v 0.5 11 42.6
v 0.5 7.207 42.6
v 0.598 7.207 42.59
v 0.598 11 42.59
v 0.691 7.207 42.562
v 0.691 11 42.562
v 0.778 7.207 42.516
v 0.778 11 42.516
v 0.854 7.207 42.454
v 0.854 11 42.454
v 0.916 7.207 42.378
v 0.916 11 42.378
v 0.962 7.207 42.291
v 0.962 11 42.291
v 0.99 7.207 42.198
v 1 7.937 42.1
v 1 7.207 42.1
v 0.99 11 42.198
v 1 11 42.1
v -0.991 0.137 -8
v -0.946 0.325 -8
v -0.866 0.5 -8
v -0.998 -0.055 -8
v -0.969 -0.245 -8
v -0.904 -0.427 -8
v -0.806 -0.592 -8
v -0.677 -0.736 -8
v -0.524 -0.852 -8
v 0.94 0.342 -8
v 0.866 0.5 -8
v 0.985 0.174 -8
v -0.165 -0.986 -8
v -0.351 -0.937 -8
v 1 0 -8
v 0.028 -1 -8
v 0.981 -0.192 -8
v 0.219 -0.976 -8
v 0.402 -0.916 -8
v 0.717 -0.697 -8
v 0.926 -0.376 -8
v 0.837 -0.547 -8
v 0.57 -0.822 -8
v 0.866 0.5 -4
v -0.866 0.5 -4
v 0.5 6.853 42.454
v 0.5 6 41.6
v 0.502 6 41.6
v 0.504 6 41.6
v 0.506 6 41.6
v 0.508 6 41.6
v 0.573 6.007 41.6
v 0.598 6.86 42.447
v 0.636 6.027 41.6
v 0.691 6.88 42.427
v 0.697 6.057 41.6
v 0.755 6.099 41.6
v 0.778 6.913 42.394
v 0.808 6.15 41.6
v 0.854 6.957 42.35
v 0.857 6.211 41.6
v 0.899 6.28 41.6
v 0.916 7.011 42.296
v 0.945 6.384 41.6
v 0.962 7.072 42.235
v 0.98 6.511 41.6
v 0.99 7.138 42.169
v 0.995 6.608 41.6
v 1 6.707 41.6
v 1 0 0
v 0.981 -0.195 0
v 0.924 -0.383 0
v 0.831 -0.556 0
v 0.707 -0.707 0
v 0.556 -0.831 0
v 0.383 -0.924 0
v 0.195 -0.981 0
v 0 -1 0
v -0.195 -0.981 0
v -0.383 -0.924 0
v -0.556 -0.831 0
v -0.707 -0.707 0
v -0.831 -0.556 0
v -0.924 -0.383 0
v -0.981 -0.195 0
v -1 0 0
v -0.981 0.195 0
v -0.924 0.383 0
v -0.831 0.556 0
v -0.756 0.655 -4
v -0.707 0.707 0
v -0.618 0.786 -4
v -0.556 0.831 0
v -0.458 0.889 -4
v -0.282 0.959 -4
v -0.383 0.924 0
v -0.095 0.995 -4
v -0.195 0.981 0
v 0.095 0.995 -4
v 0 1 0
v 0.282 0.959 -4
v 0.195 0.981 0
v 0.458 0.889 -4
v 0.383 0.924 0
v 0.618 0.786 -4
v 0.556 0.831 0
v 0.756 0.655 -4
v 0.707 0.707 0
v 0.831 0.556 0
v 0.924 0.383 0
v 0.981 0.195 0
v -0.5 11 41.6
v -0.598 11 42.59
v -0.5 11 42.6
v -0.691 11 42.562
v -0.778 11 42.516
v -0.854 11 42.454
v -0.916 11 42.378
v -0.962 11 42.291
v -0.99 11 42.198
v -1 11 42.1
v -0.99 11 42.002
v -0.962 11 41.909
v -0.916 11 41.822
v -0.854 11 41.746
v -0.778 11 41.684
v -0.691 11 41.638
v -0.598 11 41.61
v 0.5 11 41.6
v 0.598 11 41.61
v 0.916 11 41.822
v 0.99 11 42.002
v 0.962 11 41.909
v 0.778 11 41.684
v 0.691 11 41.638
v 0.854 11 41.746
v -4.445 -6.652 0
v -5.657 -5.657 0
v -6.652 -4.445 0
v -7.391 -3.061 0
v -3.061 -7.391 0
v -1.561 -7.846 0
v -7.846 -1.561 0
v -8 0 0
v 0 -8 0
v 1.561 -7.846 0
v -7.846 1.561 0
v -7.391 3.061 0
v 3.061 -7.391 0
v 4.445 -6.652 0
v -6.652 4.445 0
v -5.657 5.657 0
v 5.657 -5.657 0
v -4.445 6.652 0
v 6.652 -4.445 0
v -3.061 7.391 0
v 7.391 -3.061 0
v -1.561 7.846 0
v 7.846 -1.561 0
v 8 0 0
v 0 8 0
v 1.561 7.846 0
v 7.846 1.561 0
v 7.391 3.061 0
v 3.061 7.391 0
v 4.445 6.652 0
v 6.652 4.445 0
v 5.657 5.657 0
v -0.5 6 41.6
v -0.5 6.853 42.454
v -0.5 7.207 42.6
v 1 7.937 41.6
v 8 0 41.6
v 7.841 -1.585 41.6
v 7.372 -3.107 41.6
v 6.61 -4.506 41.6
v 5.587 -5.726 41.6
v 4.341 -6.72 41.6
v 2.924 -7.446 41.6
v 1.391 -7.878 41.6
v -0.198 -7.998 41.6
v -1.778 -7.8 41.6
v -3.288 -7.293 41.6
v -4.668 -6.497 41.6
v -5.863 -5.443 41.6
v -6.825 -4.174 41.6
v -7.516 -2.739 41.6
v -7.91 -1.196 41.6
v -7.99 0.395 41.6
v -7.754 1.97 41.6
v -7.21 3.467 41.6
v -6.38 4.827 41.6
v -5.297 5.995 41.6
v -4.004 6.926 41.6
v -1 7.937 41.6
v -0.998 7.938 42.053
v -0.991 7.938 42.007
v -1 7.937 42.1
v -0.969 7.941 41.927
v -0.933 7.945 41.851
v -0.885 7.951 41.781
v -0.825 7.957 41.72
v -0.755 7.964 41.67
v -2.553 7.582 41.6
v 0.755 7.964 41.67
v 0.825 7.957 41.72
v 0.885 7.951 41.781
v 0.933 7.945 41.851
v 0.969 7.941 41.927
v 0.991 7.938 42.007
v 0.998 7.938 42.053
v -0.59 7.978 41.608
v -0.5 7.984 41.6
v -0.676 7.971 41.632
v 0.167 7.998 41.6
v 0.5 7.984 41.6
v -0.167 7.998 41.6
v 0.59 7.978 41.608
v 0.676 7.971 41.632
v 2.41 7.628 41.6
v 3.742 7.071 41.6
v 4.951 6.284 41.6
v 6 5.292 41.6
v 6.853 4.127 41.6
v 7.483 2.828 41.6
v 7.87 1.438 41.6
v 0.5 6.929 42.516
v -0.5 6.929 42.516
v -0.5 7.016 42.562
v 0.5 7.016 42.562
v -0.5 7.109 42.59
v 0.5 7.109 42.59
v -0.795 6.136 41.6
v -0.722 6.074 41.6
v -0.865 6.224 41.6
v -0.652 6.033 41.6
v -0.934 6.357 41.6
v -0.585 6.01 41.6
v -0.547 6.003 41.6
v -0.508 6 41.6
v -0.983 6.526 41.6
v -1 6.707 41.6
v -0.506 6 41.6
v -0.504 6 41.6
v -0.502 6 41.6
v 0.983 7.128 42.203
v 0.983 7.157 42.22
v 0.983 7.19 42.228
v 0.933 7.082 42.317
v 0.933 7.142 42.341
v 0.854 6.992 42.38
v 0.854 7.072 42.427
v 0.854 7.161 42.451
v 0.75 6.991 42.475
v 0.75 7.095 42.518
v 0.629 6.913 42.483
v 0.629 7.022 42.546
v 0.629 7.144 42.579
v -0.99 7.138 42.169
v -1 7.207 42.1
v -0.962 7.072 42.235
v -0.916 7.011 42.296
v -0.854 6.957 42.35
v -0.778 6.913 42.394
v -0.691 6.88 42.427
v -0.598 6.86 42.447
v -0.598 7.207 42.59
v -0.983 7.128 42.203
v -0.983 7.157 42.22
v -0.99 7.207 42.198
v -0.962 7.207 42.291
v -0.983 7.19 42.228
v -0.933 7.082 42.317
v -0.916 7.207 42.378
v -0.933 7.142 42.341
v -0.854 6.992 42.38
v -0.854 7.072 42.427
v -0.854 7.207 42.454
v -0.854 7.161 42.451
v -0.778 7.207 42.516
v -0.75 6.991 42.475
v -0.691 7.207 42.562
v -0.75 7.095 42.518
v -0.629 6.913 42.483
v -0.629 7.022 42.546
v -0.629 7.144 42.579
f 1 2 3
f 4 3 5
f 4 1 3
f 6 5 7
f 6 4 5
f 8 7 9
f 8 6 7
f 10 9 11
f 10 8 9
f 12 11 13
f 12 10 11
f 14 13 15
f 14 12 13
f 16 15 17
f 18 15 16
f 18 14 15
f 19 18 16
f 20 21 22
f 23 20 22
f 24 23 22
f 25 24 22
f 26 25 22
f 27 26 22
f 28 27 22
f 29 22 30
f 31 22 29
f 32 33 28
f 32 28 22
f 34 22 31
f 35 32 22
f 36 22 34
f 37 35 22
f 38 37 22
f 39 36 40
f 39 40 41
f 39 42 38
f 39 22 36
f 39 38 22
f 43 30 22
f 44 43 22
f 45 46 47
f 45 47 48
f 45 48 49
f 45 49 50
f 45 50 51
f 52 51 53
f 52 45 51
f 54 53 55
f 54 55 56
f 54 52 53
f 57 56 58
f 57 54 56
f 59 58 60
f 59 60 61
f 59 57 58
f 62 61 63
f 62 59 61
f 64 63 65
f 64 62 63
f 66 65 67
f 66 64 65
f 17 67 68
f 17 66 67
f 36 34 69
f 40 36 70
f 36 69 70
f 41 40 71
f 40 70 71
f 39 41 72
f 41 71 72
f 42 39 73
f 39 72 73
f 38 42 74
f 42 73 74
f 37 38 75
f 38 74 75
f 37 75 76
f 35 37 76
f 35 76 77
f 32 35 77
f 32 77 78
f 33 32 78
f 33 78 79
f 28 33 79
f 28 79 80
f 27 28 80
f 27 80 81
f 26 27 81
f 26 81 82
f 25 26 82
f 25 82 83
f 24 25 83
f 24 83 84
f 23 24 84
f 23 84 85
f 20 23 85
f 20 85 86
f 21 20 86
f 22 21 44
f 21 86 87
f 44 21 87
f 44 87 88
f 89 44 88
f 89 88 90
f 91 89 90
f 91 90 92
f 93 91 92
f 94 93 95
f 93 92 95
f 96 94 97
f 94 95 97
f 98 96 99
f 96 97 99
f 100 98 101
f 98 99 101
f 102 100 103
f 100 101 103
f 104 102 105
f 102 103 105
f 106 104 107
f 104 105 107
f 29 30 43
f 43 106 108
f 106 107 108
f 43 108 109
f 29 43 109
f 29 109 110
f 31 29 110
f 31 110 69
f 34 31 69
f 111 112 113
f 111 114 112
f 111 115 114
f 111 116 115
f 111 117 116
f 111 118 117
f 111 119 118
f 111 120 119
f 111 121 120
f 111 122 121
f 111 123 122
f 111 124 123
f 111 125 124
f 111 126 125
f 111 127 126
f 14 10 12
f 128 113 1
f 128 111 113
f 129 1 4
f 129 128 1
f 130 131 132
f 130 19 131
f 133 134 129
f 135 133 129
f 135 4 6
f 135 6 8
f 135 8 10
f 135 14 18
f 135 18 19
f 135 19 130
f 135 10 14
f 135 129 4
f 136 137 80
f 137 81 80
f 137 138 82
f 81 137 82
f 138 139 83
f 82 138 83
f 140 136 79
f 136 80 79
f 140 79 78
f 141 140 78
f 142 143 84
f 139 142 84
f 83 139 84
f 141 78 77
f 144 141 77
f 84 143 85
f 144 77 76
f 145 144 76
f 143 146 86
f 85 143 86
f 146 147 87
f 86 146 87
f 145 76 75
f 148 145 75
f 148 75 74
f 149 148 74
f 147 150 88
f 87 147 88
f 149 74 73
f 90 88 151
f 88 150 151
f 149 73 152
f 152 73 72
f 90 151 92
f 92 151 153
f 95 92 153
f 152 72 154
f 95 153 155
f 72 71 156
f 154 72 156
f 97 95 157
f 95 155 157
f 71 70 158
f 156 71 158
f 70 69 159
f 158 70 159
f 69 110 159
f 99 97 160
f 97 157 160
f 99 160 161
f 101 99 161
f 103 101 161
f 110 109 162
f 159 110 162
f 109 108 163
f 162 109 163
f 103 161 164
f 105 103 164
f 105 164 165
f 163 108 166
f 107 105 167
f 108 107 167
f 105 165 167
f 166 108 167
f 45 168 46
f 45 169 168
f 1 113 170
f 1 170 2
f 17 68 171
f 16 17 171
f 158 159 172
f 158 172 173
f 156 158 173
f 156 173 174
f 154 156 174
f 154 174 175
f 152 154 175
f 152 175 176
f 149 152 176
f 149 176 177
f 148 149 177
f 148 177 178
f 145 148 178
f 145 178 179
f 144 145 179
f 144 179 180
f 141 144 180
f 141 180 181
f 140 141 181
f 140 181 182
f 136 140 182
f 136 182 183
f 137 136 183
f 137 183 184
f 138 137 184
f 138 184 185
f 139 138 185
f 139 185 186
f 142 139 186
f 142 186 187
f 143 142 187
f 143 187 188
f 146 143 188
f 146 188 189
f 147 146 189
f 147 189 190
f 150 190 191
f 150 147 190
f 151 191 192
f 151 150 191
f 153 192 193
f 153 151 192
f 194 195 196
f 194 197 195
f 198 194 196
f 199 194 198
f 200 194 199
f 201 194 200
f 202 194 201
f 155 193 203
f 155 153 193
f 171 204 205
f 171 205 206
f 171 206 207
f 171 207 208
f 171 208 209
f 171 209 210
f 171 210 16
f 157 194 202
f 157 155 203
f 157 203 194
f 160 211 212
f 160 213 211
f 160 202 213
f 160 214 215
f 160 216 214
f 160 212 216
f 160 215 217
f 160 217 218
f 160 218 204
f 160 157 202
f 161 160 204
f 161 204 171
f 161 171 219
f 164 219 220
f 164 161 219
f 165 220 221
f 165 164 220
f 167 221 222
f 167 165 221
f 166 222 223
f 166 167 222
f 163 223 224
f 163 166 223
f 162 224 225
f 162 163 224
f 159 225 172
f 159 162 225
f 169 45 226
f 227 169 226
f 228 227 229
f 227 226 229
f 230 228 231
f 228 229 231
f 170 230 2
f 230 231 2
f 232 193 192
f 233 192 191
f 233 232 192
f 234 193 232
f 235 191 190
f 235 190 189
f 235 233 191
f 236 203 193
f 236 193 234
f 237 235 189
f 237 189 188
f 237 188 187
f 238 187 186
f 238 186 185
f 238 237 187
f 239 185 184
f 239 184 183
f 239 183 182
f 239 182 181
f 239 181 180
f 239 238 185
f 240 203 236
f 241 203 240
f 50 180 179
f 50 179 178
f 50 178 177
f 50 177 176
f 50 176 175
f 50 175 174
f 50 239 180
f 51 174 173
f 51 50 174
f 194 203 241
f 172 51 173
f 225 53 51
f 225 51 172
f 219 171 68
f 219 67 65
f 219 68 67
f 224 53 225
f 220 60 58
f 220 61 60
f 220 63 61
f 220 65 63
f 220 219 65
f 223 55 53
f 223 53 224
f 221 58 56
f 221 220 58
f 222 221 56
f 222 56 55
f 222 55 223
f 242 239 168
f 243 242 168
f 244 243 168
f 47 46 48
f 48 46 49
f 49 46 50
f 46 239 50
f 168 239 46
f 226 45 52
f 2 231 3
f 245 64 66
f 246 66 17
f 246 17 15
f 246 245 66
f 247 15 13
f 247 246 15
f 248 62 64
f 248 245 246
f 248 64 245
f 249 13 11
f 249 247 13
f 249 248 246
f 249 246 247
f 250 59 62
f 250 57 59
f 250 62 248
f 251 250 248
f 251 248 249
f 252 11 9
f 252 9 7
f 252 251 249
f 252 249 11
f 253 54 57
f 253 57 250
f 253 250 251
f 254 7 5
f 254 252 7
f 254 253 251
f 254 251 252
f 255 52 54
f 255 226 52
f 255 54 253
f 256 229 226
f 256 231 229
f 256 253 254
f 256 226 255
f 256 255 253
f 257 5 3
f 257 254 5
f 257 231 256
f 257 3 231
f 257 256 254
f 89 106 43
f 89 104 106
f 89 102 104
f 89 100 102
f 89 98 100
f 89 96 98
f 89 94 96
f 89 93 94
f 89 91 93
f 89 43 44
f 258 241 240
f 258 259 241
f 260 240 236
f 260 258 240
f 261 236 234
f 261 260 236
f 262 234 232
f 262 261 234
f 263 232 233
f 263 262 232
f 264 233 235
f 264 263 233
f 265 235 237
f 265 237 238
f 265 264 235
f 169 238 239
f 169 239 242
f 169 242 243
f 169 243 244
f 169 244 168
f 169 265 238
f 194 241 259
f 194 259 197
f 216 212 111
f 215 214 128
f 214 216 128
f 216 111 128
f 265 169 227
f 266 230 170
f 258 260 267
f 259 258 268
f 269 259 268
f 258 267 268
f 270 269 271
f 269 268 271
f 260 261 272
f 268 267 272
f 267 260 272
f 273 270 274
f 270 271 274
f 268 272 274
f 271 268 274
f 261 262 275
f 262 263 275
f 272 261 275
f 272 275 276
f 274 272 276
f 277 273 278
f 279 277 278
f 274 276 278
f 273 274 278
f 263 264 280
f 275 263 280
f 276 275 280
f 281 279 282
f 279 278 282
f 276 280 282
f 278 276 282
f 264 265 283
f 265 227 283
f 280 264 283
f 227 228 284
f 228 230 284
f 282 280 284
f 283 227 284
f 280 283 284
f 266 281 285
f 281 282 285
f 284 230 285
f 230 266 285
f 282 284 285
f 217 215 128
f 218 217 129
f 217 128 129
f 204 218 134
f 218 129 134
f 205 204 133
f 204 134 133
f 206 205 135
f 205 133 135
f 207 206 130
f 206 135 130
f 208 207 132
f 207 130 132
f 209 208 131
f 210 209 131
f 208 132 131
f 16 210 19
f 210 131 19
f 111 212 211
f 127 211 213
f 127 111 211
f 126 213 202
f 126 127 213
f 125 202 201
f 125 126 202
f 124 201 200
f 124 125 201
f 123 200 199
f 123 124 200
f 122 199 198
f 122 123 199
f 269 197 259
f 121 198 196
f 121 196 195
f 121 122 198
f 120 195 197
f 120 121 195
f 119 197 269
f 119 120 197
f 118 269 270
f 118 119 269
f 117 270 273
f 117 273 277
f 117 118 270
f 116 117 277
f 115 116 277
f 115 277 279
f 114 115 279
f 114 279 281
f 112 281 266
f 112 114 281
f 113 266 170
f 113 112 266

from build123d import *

# Parameters (mm, degrees)
SKETCH1_R           = 8
BOSS_EXTRUDE1_DEPTH = 41.6
SKETCH2_W           = 2
SKETCH2_H           = 5
BOSS_EXTRUDE2_DEPTH = 1
CHAMFER1_SIZE       = 1
FILLET1_R           = 0.5
FILLET2_R           = 0.5
SKETCH3_R           = 1
BOSS_EXTRUDE3_DEPTH = 8
SKETCH4_W           = 2.782468735
SKETCH4_H           = 1.387929773
CUT_EXTRUDE1_DEPTH  = 4


# Some blends are built 0.0001 mm under size
with BuildPart() as part:
    # Sketch1 → Boss-Extrude1 (new body)
    with BuildSketch(Plane.XY):
        Circle(SKETCH1_R)
    extrude(amount=BOSS_EXTRUDE1_DEPTH)

    # Sketch2 → Boss-Extrude2 (add)
    with BuildSketch(Plane.XY.offset(41.6)):
        with Locations((0, 8.5)):
            Rectangle(SKETCH2_W, SKETCH2_H)
    extrude(amount=BOSS_EXTRUDE2_DEPTH)

    # Chamfer1
    chamfer1_edges = [part.edges().sort_by_distance(p)[0] for p in [
        (0, 6, 42.6),
    ]]
    chamfer(chamfer1_edges, length=CHAMFER1_SIZE - 0.0001)  # a hair under: the kernel refuses the full size

    # Fillet1
    fillet1_edges = [part.edges().sort_by_distance(p)[0] for p in [
        (1, 8.99995, 42.6),
        (0, 6.9999, 42.6),
        (1, 6.49995, 42.10005),
        (-1, 6.49995, 42.10005),
        (-1, 8.99995, 42.6),
    ]]
    fillet(fillet1_edges, radius=FILLET1_R)

    # Fillet2
    # the kernel refuses this fillet: 0.5 mm, written as the material it takes off along each edge
    with BuildSketch(Plane(origin=(-1, 6.687253933, 41.6), x_dir=(0, 0, 1), z_dir=(0, 1, 0))) as fillet2_piece_1_section:
        with BuildLine():
            CenterArc((FILLET2_R, FILLET2_R), FILLET2_R, 180, 90)
            Line((0, FILLET2_R), (-FILLET2_R * 0.02, FILLET2_R))
            Line((-FILLET2_R * 0.02, FILLET2_R), (-FILLET2_R * 0.02, -FILLET2_R * 0.02))
            Line((-FILLET2_R * 0.02, -FILLET2_R * 0.02), (FILLET2_R, -FILLET2_R * 0.02))
            Line((FILLET2_R, -FILLET2_R * 0.02), (FILLET2_R, 0))
        make_face()
    fillet2_piece_1 = extrude(amount=4.312746067, mode=Mode.PRIVATE)
    fillet2_piece_1 = split(fillet2_piece_1, bisect_by=Plane(origin=(-0.898582018, 9.474400051, 41.6), z_dir=(0, 0, 1)), keep=Keep.TOP, mode=Mode.PRIVATE)
    fillet2_piece_1 = fillet2_piece_1 - Plane(origin=(0, 0, 41.723690259), x_dir=(1, 0, 0), z_dir=(0, 0, -1)) * Cylinder(8, 11, mode=Mode.PRIVATE)
    add(fillet2_piece_1, mode=Mode.SUBTRACT)
    with BuildSketch(Plane(origin=(1, 11, 41.6), x_dir=(-1, 0, 0), z_dir=(0, -1, 0))) as fillet2_piece_2_section:
        with BuildLine():
            CenterArc((FILLET2_R, -FILLET2_R), FILLET2_R, 90, 90)
            Line((0, -FILLET2_R), (-FILLET2_R * 0.02, -FILLET2_R))
            Line((-FILLET2_R * 0.02, -FILLET2_R), (-FILLET2_R * 0.02, FILLET2_R * 0.02))
            Line((-FILLET2_R * 0.02, FILLET2_R * 0.02), (FILLET2_R, FILLET2_R * 0.02))
            Line((FILLET2_R, FILLET2_R * 0.02), (FILLET2_R, 0))
        make_face()
    fillet2_piece_2 = extrude(amount=4.312746067, mode=Mode.PRIVATE)
    fillet2_piece_2 = split(fillet2_piece_2, bisect_by=Plane(origin=(0.898581764, 9.474398488, 41.6), z_dir=(0, 0, 1)), keep=Keep.TOP, mode=Mode.PRIVATE)
    fillet2_piece_2 = fillet2_piece_2 - Plane(origin=(0, 0, 41.723690294), x_dir=(1, 0, 0), z_dir=(0, 0, -1)) * Cylinder(8, 11, mode=Mode.PRIVATE)
    add(fillet2_piece_2, mode=Mode.SUBTRACT)

    # Sketch3 → Boss-Extrude3 (add)
    with BuildSketch(Plane(origin=(0, 0, 0), x_dir=(-1, 0, 0), z_dir=(0, 0, -1))):
        with Locations(Location((0, 0, 0), (0, 0, 180))):
            Circle(SKETCH3_R)
    extrude(amount=BOSS_EXTRUDE3_DEPTH)

    # Sketch4 → Cut-Extrude1 (cut)
    with BuildSketch(Plane(origin=(0, 0, -8), x_dir=(-1, 0, 0), z_dir=(0, 0, -1))):
        with Locations((0.104073174, 1.193964887)):
            Rectangle(SKETCH4_W, SKETCH4_H)
    extrude(amount=-CUT_EXTRUDE1_DEPTH, mode=Mode.SUBTRACT)


solid = part.part
